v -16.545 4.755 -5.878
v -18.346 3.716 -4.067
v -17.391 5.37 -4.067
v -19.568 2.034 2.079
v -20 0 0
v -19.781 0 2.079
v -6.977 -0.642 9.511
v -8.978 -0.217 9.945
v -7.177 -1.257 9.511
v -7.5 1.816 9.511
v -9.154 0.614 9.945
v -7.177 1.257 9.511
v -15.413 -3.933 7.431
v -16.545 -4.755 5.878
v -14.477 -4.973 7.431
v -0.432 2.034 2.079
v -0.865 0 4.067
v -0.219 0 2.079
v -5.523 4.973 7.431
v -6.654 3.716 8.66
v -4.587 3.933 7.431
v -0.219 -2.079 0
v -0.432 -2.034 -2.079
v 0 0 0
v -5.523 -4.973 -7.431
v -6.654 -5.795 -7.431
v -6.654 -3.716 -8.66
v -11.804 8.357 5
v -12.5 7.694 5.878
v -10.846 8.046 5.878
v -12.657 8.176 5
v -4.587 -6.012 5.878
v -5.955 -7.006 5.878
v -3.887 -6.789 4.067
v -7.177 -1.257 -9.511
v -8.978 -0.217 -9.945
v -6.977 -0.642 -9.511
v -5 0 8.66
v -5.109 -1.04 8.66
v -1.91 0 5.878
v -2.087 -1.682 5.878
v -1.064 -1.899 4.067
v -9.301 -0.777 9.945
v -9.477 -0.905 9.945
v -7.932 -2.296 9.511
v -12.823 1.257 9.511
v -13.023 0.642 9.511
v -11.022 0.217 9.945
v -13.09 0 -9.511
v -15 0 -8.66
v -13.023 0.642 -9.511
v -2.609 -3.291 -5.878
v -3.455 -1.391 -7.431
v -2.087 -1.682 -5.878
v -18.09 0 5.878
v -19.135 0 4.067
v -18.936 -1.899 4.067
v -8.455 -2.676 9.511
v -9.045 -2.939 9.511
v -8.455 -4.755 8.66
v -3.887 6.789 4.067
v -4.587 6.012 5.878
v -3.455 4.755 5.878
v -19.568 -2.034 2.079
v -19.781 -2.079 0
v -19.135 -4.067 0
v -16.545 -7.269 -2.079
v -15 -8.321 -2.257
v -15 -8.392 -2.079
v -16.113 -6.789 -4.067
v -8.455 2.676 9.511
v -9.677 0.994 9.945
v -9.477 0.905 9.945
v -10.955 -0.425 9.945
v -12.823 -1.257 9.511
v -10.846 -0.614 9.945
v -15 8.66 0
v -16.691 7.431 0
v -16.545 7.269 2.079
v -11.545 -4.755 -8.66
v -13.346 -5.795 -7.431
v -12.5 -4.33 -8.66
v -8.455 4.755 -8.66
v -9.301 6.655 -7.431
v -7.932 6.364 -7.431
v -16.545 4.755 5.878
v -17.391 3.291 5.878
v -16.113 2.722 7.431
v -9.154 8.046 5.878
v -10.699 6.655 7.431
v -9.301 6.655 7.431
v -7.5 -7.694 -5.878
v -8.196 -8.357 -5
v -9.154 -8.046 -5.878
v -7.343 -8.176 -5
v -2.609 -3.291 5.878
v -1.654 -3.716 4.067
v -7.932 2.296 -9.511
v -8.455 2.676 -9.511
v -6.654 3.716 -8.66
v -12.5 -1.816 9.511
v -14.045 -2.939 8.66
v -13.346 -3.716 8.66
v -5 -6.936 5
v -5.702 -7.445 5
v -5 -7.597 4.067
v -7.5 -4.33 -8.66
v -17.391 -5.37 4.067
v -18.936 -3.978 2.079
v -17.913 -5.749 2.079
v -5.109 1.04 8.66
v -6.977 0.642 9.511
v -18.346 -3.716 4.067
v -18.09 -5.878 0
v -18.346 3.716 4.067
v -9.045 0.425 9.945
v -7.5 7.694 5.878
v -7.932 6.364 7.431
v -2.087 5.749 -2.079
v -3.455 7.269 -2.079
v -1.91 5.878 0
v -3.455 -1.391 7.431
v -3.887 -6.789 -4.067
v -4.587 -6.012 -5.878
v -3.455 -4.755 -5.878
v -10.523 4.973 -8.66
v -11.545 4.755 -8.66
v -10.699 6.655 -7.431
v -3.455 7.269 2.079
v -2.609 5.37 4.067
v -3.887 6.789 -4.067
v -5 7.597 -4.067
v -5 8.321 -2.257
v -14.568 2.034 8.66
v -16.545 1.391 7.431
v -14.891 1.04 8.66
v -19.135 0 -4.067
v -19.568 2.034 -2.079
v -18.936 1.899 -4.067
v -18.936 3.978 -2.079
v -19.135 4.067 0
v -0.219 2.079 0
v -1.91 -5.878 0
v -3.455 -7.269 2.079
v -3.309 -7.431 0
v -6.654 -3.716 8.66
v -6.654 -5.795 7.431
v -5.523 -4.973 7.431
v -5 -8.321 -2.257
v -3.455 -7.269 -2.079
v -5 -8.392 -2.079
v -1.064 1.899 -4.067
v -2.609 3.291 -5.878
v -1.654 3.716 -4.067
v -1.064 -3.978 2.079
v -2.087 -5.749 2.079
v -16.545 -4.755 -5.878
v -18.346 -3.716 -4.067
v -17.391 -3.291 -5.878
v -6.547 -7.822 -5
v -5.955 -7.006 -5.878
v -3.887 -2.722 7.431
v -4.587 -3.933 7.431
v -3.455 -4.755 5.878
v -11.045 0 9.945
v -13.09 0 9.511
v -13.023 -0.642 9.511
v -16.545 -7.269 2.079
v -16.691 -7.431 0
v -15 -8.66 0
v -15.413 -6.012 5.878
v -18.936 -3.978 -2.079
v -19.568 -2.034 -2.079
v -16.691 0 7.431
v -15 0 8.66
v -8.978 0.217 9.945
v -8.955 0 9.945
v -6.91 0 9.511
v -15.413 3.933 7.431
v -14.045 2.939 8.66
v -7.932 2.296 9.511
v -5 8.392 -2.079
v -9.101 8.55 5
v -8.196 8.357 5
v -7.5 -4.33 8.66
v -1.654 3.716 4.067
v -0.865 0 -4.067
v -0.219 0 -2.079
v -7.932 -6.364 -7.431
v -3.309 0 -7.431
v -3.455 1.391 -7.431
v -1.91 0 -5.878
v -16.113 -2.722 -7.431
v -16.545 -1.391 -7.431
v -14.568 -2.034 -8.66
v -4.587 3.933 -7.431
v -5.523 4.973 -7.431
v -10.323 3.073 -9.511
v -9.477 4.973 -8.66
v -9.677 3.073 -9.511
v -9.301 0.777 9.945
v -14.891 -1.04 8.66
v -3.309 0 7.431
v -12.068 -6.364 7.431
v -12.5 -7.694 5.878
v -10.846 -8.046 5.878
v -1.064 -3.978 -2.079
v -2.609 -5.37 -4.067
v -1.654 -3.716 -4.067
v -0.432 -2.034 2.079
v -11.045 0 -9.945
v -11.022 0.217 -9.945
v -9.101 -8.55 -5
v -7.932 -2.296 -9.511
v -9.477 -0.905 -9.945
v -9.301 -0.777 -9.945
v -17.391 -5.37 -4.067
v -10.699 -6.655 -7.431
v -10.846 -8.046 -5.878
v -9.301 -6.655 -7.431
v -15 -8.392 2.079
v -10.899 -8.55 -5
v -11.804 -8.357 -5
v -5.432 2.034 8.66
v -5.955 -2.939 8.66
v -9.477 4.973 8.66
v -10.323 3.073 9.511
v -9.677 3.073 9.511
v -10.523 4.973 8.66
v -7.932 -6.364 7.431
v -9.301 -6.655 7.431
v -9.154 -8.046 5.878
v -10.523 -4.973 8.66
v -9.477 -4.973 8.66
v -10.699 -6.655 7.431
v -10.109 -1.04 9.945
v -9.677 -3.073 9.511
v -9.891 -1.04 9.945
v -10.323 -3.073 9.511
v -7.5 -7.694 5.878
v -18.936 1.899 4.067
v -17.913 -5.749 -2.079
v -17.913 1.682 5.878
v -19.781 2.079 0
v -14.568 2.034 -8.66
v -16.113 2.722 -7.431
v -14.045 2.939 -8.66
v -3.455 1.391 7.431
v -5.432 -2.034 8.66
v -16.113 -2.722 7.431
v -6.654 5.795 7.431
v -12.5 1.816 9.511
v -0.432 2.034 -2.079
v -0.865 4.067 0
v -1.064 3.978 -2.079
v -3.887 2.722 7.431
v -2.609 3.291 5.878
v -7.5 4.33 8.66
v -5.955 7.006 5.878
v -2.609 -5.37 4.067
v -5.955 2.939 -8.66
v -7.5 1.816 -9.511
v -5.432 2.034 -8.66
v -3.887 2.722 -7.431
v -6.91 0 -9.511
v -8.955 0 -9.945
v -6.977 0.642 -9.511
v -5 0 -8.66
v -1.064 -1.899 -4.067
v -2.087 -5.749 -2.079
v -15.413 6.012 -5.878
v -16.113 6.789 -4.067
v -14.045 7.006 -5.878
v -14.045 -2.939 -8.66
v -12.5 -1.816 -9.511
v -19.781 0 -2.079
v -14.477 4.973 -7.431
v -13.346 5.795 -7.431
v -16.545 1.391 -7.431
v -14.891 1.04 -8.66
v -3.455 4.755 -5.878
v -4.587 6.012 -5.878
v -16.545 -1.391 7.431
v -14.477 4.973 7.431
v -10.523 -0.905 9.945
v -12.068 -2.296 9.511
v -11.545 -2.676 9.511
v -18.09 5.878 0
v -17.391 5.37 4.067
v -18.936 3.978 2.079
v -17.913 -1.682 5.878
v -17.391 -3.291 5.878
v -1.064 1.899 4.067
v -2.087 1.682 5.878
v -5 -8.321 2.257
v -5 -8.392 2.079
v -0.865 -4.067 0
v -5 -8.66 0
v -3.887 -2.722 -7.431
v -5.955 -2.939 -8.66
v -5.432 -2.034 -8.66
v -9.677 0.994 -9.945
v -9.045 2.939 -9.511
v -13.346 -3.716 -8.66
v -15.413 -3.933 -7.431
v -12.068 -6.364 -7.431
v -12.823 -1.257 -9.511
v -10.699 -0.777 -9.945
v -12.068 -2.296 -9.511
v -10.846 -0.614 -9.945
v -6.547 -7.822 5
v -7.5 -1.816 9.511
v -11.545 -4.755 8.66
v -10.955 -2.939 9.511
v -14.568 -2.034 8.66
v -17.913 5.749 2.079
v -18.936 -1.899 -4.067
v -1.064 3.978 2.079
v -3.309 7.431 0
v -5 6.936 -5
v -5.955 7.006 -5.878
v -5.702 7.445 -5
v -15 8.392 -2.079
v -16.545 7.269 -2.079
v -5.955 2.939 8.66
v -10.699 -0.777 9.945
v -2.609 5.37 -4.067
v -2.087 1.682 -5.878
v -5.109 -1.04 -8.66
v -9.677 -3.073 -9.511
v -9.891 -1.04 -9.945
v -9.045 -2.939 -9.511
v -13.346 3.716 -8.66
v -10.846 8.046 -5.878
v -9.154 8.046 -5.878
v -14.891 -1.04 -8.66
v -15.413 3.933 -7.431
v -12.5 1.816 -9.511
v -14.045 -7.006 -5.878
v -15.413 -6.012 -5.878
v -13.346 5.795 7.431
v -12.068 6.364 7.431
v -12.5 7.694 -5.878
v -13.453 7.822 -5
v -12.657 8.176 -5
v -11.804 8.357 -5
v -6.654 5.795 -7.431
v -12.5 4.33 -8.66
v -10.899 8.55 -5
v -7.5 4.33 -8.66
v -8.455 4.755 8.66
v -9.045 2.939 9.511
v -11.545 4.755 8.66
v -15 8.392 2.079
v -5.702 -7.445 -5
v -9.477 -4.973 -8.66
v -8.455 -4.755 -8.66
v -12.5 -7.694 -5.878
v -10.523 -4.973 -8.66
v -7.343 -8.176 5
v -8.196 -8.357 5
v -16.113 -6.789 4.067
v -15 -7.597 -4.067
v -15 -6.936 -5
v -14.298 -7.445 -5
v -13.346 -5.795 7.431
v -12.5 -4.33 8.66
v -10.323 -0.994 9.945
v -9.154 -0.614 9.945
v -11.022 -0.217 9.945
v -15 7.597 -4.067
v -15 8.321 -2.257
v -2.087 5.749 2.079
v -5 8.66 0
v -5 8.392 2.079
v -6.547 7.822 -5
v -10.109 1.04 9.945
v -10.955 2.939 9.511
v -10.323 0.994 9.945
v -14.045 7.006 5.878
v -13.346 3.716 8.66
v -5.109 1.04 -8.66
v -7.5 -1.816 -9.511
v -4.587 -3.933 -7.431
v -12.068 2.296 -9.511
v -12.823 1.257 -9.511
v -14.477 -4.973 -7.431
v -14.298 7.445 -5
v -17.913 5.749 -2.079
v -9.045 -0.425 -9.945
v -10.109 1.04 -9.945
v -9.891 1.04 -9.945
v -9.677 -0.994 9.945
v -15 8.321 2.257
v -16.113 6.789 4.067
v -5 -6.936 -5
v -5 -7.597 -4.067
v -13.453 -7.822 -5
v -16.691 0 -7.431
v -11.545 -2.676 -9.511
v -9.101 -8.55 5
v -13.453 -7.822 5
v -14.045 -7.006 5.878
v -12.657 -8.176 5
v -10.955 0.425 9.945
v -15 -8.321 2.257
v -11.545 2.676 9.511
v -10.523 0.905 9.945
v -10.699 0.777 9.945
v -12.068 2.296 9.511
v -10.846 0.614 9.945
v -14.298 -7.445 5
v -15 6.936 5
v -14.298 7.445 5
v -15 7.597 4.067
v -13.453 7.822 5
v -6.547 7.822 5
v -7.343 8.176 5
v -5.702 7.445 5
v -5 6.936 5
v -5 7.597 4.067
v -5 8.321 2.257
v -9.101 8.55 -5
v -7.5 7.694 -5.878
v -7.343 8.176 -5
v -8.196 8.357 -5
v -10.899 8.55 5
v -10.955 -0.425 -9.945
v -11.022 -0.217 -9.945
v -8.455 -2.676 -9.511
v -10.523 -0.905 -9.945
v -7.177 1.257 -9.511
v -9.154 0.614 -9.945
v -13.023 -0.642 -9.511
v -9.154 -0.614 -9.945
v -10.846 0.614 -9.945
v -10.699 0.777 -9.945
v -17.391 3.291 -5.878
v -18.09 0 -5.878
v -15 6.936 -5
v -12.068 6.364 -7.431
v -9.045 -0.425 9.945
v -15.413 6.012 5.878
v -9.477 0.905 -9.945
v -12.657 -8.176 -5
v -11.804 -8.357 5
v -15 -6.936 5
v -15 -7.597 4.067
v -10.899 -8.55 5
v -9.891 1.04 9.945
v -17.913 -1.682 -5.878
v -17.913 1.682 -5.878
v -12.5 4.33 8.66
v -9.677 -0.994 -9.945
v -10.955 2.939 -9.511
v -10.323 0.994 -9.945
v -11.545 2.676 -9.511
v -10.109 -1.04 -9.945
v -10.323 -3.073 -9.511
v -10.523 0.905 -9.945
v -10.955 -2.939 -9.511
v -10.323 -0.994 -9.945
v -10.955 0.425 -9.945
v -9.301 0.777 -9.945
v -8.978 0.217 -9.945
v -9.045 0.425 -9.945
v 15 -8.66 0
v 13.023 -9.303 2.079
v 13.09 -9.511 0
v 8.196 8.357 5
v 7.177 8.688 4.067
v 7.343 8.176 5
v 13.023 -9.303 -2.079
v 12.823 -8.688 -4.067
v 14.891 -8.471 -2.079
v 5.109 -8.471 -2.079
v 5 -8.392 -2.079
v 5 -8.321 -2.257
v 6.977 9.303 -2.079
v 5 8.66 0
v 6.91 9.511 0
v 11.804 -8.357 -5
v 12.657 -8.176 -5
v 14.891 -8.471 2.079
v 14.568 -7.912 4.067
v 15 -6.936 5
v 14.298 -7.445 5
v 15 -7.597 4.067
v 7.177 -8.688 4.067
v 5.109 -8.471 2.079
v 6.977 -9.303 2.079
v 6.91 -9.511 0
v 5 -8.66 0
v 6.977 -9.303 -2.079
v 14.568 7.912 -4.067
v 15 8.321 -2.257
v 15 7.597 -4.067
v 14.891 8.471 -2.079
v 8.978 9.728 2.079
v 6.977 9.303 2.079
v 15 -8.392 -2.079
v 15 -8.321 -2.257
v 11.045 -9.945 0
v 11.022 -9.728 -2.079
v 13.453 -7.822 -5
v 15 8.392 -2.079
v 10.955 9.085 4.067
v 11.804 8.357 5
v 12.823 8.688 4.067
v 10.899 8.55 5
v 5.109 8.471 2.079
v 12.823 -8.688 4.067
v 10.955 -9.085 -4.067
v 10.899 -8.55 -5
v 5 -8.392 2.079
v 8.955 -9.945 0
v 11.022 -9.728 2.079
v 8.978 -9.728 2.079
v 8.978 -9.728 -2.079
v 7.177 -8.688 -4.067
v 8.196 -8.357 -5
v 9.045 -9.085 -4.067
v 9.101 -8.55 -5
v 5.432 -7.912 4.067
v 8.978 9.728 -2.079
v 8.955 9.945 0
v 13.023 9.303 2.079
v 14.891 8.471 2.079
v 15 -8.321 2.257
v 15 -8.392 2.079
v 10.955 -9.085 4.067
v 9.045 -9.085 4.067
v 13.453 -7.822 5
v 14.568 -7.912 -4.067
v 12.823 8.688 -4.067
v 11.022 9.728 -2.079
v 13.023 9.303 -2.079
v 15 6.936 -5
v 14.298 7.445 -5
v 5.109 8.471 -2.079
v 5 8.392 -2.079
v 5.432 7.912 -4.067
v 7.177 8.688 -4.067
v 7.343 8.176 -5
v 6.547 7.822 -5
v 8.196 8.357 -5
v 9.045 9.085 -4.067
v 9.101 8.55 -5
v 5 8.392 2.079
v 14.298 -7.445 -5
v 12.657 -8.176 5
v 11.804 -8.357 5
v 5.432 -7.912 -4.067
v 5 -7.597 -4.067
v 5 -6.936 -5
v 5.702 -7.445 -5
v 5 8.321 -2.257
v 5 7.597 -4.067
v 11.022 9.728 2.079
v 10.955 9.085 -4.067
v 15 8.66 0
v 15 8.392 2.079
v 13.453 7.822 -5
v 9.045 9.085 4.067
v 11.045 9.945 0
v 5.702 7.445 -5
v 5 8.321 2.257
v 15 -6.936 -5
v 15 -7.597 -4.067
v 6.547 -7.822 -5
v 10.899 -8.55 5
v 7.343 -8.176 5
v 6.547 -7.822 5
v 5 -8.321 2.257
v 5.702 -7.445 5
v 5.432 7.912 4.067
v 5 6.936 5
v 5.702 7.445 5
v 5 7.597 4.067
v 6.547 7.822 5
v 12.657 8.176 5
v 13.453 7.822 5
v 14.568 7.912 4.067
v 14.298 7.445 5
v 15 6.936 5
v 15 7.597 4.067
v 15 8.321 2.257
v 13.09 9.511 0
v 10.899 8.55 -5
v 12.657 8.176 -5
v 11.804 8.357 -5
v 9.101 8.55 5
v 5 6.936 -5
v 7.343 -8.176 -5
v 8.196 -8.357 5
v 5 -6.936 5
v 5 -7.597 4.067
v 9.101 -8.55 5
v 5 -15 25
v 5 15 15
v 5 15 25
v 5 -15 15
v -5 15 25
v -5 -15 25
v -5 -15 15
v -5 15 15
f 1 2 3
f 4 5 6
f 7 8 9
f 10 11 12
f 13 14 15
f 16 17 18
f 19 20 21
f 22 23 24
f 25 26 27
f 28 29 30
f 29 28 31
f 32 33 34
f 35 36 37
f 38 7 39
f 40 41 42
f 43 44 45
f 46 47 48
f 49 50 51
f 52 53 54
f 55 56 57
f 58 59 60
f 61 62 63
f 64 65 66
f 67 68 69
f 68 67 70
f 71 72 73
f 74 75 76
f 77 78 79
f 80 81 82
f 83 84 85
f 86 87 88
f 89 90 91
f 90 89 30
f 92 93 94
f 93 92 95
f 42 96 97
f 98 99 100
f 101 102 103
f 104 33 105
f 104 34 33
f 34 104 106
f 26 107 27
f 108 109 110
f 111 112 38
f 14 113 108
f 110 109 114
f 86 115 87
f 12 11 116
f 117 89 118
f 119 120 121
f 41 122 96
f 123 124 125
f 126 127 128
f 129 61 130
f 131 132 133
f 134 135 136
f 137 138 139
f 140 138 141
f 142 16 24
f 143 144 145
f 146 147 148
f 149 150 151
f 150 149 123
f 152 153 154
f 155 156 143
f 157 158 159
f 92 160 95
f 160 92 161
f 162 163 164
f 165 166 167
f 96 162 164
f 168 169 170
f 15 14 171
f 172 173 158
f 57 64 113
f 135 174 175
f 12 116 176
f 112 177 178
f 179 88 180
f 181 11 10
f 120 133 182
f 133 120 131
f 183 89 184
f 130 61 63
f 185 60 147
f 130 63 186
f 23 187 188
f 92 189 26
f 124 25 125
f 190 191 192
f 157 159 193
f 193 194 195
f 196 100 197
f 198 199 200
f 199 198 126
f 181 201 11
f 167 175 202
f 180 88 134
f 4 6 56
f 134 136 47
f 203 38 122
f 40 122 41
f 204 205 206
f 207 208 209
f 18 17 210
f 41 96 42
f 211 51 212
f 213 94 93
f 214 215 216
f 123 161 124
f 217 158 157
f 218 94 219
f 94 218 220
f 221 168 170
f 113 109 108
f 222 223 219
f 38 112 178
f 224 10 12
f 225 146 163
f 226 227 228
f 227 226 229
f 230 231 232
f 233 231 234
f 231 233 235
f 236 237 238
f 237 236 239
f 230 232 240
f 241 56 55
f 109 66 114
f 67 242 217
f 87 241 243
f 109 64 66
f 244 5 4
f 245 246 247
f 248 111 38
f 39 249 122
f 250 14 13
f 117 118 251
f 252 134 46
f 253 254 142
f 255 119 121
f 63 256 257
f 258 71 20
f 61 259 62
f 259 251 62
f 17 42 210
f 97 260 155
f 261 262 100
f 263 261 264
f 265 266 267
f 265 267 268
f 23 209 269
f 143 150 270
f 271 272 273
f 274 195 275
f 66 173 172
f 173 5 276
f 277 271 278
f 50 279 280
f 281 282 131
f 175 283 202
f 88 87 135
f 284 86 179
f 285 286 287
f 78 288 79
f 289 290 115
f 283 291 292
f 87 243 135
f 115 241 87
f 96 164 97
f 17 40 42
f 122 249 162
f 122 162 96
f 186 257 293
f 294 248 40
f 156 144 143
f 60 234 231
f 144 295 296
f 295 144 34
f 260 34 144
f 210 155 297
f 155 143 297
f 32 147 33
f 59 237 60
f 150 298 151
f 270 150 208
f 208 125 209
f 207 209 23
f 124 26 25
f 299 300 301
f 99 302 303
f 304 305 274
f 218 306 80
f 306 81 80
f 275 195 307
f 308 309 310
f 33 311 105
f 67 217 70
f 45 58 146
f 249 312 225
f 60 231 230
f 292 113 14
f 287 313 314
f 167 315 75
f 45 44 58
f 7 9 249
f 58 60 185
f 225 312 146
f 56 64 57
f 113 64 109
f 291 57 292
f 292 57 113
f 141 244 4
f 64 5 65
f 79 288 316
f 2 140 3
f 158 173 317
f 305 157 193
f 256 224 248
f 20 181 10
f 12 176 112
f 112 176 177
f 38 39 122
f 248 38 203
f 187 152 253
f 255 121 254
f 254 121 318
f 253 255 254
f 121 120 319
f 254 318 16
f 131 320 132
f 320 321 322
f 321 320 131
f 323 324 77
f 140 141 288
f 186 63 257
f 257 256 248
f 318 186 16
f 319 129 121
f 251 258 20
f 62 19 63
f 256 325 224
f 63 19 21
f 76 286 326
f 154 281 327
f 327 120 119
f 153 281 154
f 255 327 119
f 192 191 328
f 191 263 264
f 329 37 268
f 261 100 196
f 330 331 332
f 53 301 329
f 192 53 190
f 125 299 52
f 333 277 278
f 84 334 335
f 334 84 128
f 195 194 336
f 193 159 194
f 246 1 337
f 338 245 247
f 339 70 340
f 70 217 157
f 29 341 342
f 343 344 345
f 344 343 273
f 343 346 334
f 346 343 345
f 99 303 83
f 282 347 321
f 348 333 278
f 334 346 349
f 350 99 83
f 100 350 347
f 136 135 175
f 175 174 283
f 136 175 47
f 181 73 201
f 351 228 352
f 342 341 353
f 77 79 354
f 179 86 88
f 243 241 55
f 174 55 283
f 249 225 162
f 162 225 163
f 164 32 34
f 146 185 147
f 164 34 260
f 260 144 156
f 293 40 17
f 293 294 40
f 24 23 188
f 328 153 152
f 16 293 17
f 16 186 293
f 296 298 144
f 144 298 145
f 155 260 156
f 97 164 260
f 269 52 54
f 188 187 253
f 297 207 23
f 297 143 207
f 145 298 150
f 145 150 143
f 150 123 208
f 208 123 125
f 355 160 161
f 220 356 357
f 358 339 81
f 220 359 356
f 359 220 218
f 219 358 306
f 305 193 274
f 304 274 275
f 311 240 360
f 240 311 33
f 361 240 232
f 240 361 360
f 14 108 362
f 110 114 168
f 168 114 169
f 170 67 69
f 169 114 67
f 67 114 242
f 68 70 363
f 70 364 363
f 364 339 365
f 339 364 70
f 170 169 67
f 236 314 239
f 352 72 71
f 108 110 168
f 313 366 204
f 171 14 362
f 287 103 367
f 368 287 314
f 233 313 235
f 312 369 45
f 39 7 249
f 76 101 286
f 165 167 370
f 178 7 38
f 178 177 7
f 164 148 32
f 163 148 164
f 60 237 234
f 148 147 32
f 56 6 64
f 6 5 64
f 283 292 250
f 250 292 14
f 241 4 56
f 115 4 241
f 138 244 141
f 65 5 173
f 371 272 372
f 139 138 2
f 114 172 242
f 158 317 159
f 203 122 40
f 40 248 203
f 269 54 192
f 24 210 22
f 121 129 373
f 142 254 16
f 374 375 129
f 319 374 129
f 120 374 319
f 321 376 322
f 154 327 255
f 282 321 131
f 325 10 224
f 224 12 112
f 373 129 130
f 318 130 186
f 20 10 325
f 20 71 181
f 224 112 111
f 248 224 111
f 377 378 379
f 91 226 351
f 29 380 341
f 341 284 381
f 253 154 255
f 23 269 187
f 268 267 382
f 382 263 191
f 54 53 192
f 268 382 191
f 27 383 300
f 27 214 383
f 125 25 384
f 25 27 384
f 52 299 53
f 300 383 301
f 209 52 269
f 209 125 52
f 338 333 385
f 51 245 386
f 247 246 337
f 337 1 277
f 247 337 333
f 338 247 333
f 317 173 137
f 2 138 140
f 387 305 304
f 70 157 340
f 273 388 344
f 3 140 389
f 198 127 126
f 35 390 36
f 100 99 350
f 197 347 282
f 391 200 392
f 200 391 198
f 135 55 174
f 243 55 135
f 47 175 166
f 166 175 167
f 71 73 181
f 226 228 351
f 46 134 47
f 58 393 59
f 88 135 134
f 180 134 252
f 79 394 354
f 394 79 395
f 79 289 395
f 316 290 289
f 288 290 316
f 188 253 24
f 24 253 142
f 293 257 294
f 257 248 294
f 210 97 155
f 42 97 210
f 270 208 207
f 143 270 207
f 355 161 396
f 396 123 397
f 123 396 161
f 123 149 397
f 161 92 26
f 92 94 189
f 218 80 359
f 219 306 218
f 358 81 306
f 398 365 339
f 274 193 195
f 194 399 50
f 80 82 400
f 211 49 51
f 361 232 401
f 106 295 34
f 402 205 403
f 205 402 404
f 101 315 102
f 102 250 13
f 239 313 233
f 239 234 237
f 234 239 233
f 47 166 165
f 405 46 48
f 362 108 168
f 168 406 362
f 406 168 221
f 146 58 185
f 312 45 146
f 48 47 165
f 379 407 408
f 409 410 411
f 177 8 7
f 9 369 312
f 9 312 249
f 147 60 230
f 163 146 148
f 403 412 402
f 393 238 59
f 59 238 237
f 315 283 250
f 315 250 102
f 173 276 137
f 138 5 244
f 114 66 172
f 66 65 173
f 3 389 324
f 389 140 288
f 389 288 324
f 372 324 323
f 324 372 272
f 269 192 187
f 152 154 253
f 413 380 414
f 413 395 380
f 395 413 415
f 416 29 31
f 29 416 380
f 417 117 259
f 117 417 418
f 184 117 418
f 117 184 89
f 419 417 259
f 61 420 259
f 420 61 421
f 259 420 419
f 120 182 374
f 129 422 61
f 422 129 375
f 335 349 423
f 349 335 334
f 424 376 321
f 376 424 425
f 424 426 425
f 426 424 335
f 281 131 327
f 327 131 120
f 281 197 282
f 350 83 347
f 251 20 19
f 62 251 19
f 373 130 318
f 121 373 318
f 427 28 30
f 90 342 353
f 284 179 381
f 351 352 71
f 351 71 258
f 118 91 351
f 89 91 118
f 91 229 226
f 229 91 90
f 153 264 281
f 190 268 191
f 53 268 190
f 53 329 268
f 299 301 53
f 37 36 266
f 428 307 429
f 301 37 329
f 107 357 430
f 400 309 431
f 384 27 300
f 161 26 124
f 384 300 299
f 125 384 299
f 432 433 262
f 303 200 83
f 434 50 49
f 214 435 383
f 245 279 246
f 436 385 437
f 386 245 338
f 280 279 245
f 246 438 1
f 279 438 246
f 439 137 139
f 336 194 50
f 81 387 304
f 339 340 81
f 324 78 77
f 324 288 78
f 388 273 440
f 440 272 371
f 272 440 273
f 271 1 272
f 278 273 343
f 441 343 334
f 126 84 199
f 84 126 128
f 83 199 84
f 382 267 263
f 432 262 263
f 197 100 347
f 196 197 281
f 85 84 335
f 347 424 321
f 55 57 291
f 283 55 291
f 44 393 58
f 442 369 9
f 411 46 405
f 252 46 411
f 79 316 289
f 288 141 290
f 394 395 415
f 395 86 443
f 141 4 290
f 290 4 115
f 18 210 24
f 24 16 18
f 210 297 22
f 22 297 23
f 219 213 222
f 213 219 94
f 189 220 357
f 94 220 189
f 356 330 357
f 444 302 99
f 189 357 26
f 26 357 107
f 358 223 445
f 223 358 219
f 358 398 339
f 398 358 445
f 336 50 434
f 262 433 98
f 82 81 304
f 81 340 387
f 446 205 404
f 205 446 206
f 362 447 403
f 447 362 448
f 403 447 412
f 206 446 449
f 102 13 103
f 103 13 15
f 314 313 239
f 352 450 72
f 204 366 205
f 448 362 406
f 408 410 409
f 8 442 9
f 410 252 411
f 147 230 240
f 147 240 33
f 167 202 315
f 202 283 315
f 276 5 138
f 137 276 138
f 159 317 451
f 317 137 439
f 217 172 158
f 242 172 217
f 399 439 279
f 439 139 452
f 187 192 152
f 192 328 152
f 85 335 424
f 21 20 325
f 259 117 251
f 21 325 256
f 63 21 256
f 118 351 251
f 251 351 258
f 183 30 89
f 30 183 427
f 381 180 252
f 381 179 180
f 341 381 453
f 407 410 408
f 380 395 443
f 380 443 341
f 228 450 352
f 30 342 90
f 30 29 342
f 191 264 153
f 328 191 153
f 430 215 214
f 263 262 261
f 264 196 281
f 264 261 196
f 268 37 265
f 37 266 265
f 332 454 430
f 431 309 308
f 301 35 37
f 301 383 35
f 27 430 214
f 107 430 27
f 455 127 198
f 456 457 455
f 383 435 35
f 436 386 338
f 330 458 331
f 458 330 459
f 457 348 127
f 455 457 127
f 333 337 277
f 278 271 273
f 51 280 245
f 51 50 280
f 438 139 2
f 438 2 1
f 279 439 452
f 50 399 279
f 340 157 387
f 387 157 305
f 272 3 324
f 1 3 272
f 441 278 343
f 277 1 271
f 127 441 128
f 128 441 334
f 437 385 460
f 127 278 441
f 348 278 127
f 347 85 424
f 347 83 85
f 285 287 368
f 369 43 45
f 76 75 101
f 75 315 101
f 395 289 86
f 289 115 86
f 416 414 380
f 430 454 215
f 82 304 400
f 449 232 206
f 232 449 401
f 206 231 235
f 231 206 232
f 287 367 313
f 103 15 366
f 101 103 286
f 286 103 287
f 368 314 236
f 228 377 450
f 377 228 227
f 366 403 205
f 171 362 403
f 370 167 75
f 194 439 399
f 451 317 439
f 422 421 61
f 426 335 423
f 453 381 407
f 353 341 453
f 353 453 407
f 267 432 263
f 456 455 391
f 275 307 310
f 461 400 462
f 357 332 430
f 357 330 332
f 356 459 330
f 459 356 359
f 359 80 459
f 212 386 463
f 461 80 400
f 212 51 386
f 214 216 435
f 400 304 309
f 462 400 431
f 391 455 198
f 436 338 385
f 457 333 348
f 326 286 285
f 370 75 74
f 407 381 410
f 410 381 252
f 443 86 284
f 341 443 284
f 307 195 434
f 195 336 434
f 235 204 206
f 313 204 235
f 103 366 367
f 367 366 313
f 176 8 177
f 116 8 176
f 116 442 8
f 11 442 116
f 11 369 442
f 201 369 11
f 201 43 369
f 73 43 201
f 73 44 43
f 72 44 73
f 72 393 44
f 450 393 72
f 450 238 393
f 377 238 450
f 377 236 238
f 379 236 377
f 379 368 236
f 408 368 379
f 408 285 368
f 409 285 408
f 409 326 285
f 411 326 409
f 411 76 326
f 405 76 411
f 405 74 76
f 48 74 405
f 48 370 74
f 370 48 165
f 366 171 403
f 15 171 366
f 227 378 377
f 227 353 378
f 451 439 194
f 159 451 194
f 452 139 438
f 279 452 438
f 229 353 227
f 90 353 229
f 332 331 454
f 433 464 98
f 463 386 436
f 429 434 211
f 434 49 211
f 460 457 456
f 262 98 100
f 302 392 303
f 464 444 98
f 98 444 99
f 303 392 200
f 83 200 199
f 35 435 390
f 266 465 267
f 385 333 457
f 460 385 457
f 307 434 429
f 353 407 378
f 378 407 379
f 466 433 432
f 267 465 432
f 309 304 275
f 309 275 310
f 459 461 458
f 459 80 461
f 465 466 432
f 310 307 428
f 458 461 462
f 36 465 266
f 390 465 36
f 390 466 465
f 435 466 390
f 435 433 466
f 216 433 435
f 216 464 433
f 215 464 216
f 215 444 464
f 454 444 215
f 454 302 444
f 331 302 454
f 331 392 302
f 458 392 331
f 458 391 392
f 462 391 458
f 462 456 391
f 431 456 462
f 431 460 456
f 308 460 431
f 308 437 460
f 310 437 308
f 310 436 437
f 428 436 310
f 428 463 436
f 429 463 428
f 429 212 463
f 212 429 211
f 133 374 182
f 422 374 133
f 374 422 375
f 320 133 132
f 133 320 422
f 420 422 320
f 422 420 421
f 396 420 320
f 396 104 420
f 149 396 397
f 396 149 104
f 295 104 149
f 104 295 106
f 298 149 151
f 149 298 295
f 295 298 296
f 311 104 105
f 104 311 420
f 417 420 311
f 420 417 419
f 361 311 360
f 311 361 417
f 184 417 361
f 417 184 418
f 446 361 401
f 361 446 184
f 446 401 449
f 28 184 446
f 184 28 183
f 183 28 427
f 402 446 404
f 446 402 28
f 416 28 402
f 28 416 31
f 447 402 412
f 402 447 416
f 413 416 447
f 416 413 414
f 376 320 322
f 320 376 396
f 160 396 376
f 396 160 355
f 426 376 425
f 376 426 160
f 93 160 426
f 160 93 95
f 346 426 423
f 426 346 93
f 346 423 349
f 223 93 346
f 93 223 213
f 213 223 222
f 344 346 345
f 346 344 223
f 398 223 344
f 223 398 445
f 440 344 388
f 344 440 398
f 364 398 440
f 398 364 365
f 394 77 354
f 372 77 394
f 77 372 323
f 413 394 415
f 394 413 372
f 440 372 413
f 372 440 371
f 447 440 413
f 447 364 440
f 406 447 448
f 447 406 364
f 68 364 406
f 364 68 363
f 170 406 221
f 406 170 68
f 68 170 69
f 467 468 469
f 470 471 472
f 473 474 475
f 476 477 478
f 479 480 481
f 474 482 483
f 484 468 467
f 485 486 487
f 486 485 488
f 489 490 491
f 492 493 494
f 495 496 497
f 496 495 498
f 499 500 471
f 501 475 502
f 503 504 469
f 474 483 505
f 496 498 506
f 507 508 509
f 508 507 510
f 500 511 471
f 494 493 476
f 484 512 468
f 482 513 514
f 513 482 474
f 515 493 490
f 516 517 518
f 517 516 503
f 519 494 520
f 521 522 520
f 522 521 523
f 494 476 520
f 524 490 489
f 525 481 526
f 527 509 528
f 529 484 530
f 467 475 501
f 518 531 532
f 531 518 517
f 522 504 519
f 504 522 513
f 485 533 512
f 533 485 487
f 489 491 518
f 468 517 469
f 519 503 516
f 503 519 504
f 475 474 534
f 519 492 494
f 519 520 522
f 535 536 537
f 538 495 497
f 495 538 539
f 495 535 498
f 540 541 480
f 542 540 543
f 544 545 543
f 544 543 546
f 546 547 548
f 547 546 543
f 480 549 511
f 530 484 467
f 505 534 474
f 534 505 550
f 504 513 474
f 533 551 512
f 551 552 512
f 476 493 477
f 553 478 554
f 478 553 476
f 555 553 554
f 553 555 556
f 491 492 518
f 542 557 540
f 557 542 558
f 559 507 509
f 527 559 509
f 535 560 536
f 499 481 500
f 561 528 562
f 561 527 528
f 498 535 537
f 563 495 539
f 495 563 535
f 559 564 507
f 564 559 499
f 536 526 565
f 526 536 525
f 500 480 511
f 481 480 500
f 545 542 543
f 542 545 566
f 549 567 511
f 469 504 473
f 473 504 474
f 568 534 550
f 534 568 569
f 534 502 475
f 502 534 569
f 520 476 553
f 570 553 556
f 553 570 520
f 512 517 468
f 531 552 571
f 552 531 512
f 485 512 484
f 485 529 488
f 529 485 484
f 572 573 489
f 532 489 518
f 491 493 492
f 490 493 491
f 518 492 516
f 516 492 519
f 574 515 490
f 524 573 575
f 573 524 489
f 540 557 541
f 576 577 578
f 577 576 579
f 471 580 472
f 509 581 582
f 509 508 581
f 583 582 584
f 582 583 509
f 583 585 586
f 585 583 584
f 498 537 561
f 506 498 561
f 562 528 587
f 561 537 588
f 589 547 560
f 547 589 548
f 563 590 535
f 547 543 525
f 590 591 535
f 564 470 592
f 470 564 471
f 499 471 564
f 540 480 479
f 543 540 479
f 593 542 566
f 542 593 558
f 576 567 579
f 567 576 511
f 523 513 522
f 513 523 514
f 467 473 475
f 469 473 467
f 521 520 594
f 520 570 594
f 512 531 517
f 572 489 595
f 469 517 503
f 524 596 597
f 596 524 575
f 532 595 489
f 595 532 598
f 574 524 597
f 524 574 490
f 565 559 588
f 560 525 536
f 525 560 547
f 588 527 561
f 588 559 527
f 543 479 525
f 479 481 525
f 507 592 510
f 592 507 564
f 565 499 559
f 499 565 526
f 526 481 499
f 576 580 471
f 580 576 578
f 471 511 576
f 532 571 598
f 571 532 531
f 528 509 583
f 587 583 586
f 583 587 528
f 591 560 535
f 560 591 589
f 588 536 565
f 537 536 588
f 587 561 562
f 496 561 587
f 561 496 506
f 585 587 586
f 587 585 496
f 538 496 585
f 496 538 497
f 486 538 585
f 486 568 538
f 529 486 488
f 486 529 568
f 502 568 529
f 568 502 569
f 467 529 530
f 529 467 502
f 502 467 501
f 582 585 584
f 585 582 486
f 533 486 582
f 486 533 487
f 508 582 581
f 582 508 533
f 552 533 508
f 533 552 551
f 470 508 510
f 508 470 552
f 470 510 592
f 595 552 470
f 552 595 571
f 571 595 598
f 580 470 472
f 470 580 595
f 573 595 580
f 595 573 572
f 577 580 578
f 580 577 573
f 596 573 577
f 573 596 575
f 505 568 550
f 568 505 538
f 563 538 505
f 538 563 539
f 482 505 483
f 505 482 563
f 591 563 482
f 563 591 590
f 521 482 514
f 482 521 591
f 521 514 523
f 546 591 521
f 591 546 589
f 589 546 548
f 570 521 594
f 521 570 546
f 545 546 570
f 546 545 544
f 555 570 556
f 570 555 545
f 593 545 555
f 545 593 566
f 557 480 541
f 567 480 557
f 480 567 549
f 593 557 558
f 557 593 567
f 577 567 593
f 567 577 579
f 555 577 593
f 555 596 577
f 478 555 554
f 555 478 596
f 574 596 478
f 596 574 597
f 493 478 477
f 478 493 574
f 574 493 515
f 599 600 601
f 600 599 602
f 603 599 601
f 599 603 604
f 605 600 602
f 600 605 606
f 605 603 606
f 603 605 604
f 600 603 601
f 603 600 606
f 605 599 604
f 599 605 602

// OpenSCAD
// Constructive Solid Geometry operators:
// difference() and intersection()

translate([0,0,20])
{
	%sphere(r=10);
	cube([10,30,10], center=true);
}


/*
 * difference() "subtracts" all additional items
 * from the first item.
 */
translate([-10,0,0]) render()
difference()
{
	sphere(r=10);
	cube([10,30,10], center=true);
}


/*
 * intersection() find the volume that is in
 * all of the items.
 */
translate([10,0,0]) render()
intersection()
{
	sphere(r=10);
	cube([10,30,10], center=true);
}
